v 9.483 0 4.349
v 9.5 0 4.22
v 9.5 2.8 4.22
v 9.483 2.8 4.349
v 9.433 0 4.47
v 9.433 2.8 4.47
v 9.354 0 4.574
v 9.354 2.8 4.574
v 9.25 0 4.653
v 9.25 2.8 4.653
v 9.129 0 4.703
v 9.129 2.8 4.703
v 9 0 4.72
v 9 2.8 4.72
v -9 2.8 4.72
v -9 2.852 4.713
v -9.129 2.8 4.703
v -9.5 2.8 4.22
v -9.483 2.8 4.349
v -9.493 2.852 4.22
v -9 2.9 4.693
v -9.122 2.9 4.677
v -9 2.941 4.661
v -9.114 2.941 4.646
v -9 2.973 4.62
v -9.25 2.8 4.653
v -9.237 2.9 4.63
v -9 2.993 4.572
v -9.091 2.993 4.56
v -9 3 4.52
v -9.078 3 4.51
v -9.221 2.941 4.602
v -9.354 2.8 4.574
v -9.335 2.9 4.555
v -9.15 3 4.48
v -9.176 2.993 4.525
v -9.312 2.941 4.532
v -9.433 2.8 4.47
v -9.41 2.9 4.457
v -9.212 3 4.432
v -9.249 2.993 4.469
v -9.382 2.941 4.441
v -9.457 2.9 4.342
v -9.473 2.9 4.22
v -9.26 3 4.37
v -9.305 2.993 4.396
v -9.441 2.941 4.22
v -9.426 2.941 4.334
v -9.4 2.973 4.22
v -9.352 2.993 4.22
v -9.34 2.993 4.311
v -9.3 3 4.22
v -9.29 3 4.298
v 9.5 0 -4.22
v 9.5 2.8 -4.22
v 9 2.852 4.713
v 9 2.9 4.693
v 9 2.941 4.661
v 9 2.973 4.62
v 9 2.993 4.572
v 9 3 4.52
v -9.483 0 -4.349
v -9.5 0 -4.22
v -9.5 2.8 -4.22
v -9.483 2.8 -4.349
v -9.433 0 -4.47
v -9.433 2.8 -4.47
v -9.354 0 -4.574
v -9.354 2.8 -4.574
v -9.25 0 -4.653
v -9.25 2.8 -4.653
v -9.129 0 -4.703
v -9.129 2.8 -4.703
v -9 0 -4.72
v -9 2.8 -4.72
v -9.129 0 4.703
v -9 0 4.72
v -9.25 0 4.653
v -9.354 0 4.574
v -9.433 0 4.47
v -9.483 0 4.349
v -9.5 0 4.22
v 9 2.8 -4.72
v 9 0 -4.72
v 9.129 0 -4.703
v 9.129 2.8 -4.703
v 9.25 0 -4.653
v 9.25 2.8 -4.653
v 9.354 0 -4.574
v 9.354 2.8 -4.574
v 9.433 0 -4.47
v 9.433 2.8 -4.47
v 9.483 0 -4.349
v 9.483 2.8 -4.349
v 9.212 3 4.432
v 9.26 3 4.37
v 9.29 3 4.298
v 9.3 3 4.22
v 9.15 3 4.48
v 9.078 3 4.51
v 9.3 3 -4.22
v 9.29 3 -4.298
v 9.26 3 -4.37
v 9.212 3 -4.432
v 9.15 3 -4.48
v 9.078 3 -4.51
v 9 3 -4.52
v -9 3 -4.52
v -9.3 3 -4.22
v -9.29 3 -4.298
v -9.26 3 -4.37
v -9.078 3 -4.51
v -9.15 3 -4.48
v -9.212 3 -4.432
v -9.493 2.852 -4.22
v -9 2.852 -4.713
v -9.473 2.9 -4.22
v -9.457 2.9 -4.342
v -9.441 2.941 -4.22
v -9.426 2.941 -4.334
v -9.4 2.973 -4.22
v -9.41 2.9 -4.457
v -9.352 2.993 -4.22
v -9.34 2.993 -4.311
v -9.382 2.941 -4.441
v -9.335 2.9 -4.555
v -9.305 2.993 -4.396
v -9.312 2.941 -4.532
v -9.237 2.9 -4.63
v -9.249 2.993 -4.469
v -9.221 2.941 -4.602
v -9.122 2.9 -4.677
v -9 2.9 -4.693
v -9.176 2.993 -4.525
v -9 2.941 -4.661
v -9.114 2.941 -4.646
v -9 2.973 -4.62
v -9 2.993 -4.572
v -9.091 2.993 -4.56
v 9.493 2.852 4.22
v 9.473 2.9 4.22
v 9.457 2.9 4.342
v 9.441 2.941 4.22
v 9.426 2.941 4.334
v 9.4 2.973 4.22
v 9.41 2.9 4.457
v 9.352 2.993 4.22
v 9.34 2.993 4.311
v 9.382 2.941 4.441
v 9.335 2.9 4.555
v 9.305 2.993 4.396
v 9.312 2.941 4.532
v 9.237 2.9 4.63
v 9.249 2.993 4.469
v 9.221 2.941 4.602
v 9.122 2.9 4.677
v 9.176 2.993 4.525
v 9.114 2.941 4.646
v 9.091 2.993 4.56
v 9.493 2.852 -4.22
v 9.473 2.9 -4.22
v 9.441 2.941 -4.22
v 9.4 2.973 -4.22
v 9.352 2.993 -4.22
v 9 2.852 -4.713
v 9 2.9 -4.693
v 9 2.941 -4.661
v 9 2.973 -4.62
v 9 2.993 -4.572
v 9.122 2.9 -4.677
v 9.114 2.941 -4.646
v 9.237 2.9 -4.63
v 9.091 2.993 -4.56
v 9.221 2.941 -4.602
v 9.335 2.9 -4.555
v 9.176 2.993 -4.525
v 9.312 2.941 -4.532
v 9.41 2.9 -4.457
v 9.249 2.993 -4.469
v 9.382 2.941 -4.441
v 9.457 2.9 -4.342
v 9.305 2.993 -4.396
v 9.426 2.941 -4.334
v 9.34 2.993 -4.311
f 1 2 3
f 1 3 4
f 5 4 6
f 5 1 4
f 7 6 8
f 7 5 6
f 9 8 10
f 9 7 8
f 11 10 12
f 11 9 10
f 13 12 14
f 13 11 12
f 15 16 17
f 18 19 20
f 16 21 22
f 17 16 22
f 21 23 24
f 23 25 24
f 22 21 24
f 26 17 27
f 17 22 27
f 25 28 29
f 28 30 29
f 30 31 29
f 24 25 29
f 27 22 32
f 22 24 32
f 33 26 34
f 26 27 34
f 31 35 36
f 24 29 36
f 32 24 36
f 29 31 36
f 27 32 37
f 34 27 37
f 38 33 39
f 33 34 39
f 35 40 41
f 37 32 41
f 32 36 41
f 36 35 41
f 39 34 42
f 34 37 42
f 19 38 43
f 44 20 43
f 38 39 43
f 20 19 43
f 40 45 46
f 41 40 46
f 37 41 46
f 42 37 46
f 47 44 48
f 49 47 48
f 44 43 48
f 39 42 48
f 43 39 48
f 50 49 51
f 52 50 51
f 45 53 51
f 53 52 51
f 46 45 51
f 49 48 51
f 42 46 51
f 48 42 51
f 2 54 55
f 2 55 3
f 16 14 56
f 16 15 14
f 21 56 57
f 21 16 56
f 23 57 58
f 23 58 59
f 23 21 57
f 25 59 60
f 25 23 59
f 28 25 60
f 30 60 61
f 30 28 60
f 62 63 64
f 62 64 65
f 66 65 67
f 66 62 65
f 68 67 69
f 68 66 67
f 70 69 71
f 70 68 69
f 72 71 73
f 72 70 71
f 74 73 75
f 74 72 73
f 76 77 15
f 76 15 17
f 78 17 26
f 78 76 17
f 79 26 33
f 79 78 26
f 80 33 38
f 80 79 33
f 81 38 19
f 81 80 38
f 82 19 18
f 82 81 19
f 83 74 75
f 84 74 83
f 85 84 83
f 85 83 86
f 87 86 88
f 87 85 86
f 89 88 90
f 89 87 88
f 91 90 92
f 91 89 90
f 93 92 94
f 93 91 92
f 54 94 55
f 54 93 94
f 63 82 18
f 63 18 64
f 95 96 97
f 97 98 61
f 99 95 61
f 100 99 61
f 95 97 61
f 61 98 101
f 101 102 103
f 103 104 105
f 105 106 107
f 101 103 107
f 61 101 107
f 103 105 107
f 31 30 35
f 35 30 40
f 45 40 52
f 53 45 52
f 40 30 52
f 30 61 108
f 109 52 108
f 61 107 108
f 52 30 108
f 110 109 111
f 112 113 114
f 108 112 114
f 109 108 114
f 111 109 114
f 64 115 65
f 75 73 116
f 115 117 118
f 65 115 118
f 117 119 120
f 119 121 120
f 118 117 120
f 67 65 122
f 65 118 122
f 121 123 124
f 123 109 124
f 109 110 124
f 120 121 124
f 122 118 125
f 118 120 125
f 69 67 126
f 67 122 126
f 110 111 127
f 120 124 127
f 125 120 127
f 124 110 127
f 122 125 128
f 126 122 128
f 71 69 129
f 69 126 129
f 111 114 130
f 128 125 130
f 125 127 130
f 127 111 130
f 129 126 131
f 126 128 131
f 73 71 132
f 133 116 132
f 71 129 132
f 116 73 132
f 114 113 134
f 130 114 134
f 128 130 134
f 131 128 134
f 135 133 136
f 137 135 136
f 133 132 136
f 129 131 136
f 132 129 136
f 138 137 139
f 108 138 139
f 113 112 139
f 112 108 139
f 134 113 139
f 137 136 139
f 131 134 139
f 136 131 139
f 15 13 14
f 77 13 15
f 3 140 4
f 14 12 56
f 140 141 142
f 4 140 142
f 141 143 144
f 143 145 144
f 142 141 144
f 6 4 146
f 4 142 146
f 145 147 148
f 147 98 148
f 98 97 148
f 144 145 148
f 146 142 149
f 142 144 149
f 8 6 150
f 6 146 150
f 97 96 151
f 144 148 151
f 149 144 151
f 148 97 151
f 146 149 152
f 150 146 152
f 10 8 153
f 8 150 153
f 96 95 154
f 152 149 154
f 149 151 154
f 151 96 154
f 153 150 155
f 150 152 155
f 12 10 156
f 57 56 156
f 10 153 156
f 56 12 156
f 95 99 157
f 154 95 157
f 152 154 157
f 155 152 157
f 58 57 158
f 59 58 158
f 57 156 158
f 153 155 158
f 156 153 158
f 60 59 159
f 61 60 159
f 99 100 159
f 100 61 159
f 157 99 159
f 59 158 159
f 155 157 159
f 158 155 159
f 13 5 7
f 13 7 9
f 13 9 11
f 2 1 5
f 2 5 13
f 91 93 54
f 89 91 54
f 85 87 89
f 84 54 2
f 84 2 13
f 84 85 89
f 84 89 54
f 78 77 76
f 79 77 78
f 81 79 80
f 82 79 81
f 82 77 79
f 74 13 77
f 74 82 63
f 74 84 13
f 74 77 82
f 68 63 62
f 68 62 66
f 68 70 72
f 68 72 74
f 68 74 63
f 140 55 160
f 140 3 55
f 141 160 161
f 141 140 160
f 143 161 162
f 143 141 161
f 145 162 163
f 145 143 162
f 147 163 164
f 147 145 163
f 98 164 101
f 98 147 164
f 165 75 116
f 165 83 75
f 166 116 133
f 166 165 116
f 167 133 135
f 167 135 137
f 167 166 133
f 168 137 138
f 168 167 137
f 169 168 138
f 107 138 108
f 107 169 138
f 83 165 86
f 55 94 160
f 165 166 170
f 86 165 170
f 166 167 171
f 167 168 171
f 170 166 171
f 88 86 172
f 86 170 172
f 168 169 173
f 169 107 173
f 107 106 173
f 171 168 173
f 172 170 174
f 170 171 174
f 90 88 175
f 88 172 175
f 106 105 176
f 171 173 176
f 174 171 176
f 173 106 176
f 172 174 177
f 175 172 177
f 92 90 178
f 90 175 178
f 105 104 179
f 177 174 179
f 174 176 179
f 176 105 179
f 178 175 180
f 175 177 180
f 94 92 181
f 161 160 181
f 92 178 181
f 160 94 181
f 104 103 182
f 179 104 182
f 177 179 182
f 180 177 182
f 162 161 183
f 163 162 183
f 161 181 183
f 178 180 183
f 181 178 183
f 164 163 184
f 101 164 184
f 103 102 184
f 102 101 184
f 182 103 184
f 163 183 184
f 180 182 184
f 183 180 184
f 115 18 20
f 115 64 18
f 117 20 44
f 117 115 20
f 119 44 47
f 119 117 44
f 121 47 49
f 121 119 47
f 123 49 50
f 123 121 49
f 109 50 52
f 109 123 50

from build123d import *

# Parameters (mm, degrees)
EXTRUDE_1_DEPTH = 3
FILLET_1_R      = 0.2


with BuildPart() as part:
    # Эскиз1 → Бобышка-Вытянуть1 (new body)
    with BuildSketch(Plane(origin=(0, 0, 0), x_dir=(1, 0, 0), z_dir=(0, 1, 0))):
        with BuildLine():
            Line((-9, 4.72), (9, 4.72))
            ThreePointArc((9, 4.72), (9.353553391, 4.573553391), (9.5, 4.22))
            Line((9.5, 4.22), (9.5, -4.22))
            ThreePointArc((9.5, -4.22), (9.353553391, -4.573553391), (9, -4.72))
            Line((9, -4.72), (-9, -4.72))
            ThreePointArc((-9, -4.72), (-9.353553391, -4.573553391), (-9.5, -4.22))
            Line((-9.5, -4.22), (-9.5, 4.22))
            ThreePointArc((-9.5, 4.22), (-9.353553391, 4.573553391), (-9, 4.72))
        make_face()
    extrude(amount=EXTRUDE_1_DEPTH)

    # Скругление1
    fillet_1_edges = [part.edges().sort_by_distance(p)[0] for p in [
        (-9.353553391, 3, -4.573553391),
        (-9.5, 3, 0),
        (-9.353553391, 3, 4.573553391),
        (0, 3, 4.72),
        (9.353553391, 3, 4.573553391),
        (9.5, 3, 0),
        (9.353553391, 3, -4.573553391),
        (0, 3, -4.72),
    ]]
    fillet(fillet_1_edges, radius=FILLET_1_R)


solid = part.part
